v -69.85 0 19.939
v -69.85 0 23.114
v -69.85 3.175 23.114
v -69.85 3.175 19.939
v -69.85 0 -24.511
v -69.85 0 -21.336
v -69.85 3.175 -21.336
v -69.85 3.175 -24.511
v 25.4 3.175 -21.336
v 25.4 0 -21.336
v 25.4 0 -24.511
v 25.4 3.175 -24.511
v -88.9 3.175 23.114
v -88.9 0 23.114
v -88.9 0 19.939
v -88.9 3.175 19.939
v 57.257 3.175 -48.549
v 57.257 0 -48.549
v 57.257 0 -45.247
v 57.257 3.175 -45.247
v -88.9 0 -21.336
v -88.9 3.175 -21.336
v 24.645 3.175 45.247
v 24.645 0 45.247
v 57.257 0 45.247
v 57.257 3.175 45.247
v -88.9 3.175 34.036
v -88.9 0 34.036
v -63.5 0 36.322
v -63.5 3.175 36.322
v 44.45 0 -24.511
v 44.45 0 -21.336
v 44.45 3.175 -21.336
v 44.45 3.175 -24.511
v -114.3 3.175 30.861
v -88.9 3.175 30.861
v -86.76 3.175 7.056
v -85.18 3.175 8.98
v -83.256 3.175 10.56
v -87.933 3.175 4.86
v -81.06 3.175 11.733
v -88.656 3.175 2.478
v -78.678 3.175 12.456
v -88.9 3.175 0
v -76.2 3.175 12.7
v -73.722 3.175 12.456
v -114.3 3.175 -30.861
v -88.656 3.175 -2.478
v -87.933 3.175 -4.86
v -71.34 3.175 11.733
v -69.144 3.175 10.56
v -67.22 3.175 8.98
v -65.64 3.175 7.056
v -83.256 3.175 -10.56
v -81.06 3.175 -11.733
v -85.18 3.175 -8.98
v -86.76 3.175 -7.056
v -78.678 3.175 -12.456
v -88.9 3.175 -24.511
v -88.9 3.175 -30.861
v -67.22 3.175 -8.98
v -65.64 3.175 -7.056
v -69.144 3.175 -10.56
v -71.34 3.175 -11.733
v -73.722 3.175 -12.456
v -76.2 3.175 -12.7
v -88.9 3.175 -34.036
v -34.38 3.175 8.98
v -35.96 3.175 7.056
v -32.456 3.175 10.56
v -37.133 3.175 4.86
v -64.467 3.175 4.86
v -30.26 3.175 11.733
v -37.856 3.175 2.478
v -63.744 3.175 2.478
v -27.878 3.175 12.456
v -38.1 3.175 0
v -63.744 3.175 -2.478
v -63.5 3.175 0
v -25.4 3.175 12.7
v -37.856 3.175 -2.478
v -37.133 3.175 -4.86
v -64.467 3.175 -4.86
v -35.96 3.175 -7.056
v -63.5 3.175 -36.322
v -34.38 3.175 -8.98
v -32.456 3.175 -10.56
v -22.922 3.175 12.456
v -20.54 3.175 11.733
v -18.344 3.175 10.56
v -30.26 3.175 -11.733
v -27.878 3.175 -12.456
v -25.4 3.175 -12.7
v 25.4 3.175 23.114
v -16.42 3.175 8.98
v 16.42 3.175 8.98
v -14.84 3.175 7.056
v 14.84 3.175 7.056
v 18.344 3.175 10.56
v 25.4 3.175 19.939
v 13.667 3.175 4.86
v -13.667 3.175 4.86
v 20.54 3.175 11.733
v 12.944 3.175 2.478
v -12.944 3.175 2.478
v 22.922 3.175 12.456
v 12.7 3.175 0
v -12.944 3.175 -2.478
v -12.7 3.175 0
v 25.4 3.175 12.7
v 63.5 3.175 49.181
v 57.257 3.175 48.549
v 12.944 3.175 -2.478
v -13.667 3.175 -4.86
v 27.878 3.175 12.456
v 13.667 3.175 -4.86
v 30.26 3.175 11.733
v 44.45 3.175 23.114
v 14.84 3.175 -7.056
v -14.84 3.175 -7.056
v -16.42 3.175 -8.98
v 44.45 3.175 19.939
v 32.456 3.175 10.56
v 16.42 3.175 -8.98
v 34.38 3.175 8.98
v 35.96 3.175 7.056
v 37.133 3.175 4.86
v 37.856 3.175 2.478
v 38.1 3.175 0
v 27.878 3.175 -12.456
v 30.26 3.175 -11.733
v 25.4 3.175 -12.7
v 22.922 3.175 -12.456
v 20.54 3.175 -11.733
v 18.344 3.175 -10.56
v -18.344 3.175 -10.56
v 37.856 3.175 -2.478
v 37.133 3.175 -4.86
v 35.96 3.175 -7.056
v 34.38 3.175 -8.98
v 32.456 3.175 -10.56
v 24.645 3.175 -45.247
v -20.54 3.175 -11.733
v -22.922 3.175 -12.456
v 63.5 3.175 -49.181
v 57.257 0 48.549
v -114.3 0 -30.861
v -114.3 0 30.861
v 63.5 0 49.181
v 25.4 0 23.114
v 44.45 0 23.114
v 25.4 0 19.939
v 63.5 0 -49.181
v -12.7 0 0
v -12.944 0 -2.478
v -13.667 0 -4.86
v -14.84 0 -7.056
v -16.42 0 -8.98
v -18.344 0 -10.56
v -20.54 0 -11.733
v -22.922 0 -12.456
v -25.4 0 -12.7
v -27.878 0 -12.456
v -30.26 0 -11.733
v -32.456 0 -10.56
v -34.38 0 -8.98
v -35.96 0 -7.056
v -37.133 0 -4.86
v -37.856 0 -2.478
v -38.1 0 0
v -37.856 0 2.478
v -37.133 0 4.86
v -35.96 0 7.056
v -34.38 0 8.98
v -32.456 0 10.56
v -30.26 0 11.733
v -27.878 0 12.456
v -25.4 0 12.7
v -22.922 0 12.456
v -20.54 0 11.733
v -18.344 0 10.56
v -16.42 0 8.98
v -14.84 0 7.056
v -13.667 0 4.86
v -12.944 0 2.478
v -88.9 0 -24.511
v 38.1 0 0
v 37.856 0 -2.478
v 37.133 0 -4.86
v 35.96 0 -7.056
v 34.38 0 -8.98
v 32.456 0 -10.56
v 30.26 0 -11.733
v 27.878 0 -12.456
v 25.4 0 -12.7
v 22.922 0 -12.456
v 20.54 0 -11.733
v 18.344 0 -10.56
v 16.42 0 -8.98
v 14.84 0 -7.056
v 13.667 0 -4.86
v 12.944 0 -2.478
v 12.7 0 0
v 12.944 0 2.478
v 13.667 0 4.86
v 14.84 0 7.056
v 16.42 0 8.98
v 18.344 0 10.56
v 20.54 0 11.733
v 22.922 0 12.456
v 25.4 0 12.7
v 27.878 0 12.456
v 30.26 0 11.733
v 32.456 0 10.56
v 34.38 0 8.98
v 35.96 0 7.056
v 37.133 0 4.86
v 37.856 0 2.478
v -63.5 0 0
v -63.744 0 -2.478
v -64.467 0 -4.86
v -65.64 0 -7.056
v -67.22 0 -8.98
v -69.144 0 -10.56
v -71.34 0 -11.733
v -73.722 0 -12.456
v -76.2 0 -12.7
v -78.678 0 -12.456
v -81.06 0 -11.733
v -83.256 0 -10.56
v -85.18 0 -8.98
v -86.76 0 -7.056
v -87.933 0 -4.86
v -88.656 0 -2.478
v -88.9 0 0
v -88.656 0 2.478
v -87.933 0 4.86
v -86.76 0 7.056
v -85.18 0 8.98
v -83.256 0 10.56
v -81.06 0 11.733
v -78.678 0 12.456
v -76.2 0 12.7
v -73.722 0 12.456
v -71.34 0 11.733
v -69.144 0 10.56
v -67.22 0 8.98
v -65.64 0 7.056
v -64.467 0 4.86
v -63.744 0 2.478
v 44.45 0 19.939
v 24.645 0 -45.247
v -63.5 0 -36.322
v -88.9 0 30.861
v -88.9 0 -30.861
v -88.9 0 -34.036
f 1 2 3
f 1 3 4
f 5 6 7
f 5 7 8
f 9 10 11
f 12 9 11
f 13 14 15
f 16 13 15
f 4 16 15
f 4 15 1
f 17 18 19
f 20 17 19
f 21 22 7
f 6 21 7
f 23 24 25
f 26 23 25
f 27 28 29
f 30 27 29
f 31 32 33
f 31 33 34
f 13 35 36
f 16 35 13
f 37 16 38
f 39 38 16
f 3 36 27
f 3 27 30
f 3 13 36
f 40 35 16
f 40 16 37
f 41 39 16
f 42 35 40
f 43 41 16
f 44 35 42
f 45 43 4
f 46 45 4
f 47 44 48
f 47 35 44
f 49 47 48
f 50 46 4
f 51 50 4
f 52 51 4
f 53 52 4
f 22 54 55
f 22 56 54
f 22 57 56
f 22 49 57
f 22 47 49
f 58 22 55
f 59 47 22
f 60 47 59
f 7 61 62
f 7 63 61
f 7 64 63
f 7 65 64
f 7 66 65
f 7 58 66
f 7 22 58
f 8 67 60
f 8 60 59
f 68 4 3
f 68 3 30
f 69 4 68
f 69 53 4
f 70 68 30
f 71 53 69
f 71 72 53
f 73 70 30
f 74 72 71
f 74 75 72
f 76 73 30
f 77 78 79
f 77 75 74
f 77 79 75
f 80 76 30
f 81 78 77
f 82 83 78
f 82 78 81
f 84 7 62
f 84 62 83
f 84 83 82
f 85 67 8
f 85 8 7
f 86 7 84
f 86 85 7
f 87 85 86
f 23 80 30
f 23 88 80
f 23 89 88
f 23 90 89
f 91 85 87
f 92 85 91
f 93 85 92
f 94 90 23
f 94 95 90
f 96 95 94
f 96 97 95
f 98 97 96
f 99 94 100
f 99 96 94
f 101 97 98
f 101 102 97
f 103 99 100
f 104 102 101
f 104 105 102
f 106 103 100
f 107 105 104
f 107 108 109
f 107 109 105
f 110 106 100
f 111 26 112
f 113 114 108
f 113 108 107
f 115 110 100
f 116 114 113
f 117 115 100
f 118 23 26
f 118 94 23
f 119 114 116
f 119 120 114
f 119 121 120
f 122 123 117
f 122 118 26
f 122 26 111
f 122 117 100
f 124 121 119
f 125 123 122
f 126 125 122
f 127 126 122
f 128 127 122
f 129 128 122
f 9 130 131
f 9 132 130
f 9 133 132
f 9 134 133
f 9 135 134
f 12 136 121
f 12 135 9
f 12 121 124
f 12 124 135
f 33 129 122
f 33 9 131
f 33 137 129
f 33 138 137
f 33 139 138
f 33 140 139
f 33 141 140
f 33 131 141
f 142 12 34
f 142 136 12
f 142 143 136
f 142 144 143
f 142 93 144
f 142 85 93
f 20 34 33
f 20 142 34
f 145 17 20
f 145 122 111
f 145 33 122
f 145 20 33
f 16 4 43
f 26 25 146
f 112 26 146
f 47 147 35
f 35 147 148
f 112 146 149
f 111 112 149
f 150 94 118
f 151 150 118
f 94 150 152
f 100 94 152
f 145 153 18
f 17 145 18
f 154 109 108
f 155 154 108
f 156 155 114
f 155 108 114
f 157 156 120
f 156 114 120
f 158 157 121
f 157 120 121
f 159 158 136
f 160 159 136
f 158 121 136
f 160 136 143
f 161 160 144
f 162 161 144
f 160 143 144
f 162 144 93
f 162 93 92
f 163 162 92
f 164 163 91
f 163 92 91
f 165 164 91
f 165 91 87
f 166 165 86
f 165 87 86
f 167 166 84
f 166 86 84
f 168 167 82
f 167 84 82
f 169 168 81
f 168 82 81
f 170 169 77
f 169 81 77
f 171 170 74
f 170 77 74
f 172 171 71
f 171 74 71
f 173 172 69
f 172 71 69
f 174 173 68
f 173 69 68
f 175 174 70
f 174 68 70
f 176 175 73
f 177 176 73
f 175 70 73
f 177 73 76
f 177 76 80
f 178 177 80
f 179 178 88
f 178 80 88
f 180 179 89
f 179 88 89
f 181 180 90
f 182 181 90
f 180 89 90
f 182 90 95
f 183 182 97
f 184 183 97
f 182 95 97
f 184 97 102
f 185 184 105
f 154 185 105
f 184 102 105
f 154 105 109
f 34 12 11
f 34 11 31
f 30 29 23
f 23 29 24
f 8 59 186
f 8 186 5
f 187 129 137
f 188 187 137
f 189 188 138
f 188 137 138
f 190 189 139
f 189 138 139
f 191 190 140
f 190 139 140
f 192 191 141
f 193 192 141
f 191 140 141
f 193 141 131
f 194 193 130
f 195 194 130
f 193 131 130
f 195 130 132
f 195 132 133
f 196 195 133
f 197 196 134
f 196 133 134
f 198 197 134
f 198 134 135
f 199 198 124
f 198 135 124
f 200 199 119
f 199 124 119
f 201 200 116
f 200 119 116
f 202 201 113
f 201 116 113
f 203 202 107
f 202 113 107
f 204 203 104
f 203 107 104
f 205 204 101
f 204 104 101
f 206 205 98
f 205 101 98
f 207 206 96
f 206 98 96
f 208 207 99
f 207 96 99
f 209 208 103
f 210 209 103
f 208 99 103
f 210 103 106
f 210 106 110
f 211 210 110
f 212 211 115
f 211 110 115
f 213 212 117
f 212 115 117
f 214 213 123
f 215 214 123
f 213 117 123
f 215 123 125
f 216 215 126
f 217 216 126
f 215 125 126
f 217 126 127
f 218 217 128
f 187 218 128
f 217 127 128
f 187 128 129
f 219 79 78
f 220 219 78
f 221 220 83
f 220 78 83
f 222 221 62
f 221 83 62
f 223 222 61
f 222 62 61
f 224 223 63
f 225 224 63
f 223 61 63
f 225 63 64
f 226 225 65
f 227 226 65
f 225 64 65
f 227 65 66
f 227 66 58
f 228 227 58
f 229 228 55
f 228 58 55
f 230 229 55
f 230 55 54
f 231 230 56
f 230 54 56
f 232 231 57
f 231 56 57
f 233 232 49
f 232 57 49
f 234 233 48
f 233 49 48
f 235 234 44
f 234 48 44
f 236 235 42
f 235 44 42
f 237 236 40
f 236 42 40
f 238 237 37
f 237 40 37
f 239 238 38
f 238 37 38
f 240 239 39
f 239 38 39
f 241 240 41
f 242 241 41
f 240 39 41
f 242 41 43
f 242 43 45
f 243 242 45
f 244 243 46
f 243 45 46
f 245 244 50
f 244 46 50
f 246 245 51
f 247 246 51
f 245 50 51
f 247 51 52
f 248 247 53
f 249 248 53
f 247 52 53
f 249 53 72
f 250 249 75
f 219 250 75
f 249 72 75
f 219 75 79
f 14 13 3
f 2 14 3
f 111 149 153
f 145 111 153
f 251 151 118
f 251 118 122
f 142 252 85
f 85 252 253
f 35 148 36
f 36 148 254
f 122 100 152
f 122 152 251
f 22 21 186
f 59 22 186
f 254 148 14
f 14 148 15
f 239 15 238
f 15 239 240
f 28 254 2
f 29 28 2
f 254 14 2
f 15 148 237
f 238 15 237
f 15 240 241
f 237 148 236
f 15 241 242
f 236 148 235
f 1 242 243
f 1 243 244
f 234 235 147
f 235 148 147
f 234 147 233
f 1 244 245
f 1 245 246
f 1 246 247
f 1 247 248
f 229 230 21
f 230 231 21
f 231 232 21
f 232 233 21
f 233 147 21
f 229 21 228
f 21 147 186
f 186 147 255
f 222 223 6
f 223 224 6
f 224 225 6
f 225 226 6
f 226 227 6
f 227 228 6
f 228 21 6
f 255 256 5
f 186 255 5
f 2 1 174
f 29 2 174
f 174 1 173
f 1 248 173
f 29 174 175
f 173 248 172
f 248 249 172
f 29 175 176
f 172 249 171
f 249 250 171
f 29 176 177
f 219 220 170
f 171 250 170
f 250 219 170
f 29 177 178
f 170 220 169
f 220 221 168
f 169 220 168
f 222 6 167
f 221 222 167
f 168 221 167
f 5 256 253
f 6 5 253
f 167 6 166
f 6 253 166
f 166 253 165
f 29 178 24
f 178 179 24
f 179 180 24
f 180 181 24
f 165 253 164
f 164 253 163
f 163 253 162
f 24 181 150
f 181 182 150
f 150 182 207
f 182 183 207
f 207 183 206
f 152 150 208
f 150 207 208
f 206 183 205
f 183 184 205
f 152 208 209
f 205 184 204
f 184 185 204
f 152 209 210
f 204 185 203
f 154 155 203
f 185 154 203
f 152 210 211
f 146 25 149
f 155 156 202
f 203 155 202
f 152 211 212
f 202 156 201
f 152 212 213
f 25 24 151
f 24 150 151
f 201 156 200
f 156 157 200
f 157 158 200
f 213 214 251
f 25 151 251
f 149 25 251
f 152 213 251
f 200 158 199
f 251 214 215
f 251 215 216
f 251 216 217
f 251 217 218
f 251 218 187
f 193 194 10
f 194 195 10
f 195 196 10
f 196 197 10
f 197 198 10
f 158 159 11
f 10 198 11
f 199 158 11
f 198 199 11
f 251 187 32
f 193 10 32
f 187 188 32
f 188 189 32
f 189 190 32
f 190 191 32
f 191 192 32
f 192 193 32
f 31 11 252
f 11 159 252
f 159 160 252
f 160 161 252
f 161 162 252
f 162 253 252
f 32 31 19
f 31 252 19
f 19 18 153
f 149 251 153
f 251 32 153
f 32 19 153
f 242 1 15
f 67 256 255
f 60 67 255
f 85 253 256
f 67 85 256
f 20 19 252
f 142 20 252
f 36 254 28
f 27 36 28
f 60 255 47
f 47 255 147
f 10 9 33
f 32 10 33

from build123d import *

# Parameters (mm, degrees)
BOSS_EXTRUDE2_DEPTH  = 3.175
SKETCH6_W            = 19.05
SKETCH6_H            = 3.175
CUT_EXTRUDE5_DEPTH   = 3.175
LPATTERN1_COUNT      = 2
LPATTERN1_PITCH      = 114.3
LPATTERN1_COUNT_DIR2 = 2
LPATTERN1_PITCH_DIR2 = 44.45
SKETCH7_R            = 12.7
CUT_EXTRUDE6_DEPTH   = 3.175
LPATTERN2_COUNT      = 2
LPATTERN2_PITCH      = 50.8
LPATTERN2_COL_COUNT  = 2
LPATTERN2_COL_PITCH  = 50.8


with BuildPart() as part:
    # Sketch1 → Boss-Extrude2 (new body)
    with BuildSketch(Plane(origin=(0, 0, 0), x_dir=(1, 0, 0), z_dir=(0, 1, 0))):
        Polygon((24.645444356, 45.246601981), (-63.5, 36.321593844), (-88.9, 34.035796922), (-88.9, 30.860796922), (-114.3, 30.860796922), (-114.3, -30.860796922), (-88.9, -30.860796922), (-88.9, -34.035796922), (-63.5, -36.321593844), (24.645444356, -45.246601981), (57.256759974, -45.246601981), (57.256759974, -48.548601981), (63.5, -49.18075), (63.5, 49.18075), (57.256759974, 48.548601981), (57.256759974, 45.246601981), align=None)
    extrude(amount=BOSS_EXTRUDE2_DEPTH)

    # Sketch6 → Cut-Extrude5 (cut)
    with BuildSketch(Plane(origin=(0, 3.175, 0), x_dir=(1, 0, 0), z_dir=(0, 1, 0))):
        with Locations((-79.375, 22.923296922)):
            Rectangle(SKETCH6_W, SKETCH6_H)
    cut_extrude5 = extrude(amount=-CUT_EXTRUDE5_DEPTH, mode=Mode.SUBTRACT)

    # LPattern1: Cut-Extrude5 2 × 2
    with Locations(*[(i * LPATTERN1_PITCH, 0, j * LPATTERN1_PITCH_DIR2) for i in range(LPATTERN1_COUNT) for j in range(LPATTERN1_COUNT_DIR2) if (i, j) != (0, 0)]):
        add(cut_extrude5, mode=Mode.SUBTRACT)

    # Sketch7 → Cut-Extrude6 (cut)
    with BuildSketch(Plane(origin=(0, 3.175, 0), x_dir=(1, 0, 0), z_dir=(0, 1, 0))):
        with Locations((-25.4, 0)):
            Circle(SKETCH7_R)
    cut_extrude6 = extrude(amount=-CUT_EXTRUDE6_DEPTH, mode=Mode.SUBTRACT)

    # LPattern2: Cut-Extrude6 ×2
    with Locations(*[(-i * LPATTERN2_PITCH, 0, 0) for i in range(1, LPATTERN2_COUNT)]):
        add(cut_extrude6, mode=Mode.SUBTRACT)

    # LPattern2 col: Cut-Extrude6 ×2
    with Locations(*[(i * LPATTERN2_COL_PITCH, 0, 0) for i in range(1, LPATTERN2_COL_COUNT)]):
        add(cut_extrude6, mode=Mode.SUBTRACT)


solid = part.part
